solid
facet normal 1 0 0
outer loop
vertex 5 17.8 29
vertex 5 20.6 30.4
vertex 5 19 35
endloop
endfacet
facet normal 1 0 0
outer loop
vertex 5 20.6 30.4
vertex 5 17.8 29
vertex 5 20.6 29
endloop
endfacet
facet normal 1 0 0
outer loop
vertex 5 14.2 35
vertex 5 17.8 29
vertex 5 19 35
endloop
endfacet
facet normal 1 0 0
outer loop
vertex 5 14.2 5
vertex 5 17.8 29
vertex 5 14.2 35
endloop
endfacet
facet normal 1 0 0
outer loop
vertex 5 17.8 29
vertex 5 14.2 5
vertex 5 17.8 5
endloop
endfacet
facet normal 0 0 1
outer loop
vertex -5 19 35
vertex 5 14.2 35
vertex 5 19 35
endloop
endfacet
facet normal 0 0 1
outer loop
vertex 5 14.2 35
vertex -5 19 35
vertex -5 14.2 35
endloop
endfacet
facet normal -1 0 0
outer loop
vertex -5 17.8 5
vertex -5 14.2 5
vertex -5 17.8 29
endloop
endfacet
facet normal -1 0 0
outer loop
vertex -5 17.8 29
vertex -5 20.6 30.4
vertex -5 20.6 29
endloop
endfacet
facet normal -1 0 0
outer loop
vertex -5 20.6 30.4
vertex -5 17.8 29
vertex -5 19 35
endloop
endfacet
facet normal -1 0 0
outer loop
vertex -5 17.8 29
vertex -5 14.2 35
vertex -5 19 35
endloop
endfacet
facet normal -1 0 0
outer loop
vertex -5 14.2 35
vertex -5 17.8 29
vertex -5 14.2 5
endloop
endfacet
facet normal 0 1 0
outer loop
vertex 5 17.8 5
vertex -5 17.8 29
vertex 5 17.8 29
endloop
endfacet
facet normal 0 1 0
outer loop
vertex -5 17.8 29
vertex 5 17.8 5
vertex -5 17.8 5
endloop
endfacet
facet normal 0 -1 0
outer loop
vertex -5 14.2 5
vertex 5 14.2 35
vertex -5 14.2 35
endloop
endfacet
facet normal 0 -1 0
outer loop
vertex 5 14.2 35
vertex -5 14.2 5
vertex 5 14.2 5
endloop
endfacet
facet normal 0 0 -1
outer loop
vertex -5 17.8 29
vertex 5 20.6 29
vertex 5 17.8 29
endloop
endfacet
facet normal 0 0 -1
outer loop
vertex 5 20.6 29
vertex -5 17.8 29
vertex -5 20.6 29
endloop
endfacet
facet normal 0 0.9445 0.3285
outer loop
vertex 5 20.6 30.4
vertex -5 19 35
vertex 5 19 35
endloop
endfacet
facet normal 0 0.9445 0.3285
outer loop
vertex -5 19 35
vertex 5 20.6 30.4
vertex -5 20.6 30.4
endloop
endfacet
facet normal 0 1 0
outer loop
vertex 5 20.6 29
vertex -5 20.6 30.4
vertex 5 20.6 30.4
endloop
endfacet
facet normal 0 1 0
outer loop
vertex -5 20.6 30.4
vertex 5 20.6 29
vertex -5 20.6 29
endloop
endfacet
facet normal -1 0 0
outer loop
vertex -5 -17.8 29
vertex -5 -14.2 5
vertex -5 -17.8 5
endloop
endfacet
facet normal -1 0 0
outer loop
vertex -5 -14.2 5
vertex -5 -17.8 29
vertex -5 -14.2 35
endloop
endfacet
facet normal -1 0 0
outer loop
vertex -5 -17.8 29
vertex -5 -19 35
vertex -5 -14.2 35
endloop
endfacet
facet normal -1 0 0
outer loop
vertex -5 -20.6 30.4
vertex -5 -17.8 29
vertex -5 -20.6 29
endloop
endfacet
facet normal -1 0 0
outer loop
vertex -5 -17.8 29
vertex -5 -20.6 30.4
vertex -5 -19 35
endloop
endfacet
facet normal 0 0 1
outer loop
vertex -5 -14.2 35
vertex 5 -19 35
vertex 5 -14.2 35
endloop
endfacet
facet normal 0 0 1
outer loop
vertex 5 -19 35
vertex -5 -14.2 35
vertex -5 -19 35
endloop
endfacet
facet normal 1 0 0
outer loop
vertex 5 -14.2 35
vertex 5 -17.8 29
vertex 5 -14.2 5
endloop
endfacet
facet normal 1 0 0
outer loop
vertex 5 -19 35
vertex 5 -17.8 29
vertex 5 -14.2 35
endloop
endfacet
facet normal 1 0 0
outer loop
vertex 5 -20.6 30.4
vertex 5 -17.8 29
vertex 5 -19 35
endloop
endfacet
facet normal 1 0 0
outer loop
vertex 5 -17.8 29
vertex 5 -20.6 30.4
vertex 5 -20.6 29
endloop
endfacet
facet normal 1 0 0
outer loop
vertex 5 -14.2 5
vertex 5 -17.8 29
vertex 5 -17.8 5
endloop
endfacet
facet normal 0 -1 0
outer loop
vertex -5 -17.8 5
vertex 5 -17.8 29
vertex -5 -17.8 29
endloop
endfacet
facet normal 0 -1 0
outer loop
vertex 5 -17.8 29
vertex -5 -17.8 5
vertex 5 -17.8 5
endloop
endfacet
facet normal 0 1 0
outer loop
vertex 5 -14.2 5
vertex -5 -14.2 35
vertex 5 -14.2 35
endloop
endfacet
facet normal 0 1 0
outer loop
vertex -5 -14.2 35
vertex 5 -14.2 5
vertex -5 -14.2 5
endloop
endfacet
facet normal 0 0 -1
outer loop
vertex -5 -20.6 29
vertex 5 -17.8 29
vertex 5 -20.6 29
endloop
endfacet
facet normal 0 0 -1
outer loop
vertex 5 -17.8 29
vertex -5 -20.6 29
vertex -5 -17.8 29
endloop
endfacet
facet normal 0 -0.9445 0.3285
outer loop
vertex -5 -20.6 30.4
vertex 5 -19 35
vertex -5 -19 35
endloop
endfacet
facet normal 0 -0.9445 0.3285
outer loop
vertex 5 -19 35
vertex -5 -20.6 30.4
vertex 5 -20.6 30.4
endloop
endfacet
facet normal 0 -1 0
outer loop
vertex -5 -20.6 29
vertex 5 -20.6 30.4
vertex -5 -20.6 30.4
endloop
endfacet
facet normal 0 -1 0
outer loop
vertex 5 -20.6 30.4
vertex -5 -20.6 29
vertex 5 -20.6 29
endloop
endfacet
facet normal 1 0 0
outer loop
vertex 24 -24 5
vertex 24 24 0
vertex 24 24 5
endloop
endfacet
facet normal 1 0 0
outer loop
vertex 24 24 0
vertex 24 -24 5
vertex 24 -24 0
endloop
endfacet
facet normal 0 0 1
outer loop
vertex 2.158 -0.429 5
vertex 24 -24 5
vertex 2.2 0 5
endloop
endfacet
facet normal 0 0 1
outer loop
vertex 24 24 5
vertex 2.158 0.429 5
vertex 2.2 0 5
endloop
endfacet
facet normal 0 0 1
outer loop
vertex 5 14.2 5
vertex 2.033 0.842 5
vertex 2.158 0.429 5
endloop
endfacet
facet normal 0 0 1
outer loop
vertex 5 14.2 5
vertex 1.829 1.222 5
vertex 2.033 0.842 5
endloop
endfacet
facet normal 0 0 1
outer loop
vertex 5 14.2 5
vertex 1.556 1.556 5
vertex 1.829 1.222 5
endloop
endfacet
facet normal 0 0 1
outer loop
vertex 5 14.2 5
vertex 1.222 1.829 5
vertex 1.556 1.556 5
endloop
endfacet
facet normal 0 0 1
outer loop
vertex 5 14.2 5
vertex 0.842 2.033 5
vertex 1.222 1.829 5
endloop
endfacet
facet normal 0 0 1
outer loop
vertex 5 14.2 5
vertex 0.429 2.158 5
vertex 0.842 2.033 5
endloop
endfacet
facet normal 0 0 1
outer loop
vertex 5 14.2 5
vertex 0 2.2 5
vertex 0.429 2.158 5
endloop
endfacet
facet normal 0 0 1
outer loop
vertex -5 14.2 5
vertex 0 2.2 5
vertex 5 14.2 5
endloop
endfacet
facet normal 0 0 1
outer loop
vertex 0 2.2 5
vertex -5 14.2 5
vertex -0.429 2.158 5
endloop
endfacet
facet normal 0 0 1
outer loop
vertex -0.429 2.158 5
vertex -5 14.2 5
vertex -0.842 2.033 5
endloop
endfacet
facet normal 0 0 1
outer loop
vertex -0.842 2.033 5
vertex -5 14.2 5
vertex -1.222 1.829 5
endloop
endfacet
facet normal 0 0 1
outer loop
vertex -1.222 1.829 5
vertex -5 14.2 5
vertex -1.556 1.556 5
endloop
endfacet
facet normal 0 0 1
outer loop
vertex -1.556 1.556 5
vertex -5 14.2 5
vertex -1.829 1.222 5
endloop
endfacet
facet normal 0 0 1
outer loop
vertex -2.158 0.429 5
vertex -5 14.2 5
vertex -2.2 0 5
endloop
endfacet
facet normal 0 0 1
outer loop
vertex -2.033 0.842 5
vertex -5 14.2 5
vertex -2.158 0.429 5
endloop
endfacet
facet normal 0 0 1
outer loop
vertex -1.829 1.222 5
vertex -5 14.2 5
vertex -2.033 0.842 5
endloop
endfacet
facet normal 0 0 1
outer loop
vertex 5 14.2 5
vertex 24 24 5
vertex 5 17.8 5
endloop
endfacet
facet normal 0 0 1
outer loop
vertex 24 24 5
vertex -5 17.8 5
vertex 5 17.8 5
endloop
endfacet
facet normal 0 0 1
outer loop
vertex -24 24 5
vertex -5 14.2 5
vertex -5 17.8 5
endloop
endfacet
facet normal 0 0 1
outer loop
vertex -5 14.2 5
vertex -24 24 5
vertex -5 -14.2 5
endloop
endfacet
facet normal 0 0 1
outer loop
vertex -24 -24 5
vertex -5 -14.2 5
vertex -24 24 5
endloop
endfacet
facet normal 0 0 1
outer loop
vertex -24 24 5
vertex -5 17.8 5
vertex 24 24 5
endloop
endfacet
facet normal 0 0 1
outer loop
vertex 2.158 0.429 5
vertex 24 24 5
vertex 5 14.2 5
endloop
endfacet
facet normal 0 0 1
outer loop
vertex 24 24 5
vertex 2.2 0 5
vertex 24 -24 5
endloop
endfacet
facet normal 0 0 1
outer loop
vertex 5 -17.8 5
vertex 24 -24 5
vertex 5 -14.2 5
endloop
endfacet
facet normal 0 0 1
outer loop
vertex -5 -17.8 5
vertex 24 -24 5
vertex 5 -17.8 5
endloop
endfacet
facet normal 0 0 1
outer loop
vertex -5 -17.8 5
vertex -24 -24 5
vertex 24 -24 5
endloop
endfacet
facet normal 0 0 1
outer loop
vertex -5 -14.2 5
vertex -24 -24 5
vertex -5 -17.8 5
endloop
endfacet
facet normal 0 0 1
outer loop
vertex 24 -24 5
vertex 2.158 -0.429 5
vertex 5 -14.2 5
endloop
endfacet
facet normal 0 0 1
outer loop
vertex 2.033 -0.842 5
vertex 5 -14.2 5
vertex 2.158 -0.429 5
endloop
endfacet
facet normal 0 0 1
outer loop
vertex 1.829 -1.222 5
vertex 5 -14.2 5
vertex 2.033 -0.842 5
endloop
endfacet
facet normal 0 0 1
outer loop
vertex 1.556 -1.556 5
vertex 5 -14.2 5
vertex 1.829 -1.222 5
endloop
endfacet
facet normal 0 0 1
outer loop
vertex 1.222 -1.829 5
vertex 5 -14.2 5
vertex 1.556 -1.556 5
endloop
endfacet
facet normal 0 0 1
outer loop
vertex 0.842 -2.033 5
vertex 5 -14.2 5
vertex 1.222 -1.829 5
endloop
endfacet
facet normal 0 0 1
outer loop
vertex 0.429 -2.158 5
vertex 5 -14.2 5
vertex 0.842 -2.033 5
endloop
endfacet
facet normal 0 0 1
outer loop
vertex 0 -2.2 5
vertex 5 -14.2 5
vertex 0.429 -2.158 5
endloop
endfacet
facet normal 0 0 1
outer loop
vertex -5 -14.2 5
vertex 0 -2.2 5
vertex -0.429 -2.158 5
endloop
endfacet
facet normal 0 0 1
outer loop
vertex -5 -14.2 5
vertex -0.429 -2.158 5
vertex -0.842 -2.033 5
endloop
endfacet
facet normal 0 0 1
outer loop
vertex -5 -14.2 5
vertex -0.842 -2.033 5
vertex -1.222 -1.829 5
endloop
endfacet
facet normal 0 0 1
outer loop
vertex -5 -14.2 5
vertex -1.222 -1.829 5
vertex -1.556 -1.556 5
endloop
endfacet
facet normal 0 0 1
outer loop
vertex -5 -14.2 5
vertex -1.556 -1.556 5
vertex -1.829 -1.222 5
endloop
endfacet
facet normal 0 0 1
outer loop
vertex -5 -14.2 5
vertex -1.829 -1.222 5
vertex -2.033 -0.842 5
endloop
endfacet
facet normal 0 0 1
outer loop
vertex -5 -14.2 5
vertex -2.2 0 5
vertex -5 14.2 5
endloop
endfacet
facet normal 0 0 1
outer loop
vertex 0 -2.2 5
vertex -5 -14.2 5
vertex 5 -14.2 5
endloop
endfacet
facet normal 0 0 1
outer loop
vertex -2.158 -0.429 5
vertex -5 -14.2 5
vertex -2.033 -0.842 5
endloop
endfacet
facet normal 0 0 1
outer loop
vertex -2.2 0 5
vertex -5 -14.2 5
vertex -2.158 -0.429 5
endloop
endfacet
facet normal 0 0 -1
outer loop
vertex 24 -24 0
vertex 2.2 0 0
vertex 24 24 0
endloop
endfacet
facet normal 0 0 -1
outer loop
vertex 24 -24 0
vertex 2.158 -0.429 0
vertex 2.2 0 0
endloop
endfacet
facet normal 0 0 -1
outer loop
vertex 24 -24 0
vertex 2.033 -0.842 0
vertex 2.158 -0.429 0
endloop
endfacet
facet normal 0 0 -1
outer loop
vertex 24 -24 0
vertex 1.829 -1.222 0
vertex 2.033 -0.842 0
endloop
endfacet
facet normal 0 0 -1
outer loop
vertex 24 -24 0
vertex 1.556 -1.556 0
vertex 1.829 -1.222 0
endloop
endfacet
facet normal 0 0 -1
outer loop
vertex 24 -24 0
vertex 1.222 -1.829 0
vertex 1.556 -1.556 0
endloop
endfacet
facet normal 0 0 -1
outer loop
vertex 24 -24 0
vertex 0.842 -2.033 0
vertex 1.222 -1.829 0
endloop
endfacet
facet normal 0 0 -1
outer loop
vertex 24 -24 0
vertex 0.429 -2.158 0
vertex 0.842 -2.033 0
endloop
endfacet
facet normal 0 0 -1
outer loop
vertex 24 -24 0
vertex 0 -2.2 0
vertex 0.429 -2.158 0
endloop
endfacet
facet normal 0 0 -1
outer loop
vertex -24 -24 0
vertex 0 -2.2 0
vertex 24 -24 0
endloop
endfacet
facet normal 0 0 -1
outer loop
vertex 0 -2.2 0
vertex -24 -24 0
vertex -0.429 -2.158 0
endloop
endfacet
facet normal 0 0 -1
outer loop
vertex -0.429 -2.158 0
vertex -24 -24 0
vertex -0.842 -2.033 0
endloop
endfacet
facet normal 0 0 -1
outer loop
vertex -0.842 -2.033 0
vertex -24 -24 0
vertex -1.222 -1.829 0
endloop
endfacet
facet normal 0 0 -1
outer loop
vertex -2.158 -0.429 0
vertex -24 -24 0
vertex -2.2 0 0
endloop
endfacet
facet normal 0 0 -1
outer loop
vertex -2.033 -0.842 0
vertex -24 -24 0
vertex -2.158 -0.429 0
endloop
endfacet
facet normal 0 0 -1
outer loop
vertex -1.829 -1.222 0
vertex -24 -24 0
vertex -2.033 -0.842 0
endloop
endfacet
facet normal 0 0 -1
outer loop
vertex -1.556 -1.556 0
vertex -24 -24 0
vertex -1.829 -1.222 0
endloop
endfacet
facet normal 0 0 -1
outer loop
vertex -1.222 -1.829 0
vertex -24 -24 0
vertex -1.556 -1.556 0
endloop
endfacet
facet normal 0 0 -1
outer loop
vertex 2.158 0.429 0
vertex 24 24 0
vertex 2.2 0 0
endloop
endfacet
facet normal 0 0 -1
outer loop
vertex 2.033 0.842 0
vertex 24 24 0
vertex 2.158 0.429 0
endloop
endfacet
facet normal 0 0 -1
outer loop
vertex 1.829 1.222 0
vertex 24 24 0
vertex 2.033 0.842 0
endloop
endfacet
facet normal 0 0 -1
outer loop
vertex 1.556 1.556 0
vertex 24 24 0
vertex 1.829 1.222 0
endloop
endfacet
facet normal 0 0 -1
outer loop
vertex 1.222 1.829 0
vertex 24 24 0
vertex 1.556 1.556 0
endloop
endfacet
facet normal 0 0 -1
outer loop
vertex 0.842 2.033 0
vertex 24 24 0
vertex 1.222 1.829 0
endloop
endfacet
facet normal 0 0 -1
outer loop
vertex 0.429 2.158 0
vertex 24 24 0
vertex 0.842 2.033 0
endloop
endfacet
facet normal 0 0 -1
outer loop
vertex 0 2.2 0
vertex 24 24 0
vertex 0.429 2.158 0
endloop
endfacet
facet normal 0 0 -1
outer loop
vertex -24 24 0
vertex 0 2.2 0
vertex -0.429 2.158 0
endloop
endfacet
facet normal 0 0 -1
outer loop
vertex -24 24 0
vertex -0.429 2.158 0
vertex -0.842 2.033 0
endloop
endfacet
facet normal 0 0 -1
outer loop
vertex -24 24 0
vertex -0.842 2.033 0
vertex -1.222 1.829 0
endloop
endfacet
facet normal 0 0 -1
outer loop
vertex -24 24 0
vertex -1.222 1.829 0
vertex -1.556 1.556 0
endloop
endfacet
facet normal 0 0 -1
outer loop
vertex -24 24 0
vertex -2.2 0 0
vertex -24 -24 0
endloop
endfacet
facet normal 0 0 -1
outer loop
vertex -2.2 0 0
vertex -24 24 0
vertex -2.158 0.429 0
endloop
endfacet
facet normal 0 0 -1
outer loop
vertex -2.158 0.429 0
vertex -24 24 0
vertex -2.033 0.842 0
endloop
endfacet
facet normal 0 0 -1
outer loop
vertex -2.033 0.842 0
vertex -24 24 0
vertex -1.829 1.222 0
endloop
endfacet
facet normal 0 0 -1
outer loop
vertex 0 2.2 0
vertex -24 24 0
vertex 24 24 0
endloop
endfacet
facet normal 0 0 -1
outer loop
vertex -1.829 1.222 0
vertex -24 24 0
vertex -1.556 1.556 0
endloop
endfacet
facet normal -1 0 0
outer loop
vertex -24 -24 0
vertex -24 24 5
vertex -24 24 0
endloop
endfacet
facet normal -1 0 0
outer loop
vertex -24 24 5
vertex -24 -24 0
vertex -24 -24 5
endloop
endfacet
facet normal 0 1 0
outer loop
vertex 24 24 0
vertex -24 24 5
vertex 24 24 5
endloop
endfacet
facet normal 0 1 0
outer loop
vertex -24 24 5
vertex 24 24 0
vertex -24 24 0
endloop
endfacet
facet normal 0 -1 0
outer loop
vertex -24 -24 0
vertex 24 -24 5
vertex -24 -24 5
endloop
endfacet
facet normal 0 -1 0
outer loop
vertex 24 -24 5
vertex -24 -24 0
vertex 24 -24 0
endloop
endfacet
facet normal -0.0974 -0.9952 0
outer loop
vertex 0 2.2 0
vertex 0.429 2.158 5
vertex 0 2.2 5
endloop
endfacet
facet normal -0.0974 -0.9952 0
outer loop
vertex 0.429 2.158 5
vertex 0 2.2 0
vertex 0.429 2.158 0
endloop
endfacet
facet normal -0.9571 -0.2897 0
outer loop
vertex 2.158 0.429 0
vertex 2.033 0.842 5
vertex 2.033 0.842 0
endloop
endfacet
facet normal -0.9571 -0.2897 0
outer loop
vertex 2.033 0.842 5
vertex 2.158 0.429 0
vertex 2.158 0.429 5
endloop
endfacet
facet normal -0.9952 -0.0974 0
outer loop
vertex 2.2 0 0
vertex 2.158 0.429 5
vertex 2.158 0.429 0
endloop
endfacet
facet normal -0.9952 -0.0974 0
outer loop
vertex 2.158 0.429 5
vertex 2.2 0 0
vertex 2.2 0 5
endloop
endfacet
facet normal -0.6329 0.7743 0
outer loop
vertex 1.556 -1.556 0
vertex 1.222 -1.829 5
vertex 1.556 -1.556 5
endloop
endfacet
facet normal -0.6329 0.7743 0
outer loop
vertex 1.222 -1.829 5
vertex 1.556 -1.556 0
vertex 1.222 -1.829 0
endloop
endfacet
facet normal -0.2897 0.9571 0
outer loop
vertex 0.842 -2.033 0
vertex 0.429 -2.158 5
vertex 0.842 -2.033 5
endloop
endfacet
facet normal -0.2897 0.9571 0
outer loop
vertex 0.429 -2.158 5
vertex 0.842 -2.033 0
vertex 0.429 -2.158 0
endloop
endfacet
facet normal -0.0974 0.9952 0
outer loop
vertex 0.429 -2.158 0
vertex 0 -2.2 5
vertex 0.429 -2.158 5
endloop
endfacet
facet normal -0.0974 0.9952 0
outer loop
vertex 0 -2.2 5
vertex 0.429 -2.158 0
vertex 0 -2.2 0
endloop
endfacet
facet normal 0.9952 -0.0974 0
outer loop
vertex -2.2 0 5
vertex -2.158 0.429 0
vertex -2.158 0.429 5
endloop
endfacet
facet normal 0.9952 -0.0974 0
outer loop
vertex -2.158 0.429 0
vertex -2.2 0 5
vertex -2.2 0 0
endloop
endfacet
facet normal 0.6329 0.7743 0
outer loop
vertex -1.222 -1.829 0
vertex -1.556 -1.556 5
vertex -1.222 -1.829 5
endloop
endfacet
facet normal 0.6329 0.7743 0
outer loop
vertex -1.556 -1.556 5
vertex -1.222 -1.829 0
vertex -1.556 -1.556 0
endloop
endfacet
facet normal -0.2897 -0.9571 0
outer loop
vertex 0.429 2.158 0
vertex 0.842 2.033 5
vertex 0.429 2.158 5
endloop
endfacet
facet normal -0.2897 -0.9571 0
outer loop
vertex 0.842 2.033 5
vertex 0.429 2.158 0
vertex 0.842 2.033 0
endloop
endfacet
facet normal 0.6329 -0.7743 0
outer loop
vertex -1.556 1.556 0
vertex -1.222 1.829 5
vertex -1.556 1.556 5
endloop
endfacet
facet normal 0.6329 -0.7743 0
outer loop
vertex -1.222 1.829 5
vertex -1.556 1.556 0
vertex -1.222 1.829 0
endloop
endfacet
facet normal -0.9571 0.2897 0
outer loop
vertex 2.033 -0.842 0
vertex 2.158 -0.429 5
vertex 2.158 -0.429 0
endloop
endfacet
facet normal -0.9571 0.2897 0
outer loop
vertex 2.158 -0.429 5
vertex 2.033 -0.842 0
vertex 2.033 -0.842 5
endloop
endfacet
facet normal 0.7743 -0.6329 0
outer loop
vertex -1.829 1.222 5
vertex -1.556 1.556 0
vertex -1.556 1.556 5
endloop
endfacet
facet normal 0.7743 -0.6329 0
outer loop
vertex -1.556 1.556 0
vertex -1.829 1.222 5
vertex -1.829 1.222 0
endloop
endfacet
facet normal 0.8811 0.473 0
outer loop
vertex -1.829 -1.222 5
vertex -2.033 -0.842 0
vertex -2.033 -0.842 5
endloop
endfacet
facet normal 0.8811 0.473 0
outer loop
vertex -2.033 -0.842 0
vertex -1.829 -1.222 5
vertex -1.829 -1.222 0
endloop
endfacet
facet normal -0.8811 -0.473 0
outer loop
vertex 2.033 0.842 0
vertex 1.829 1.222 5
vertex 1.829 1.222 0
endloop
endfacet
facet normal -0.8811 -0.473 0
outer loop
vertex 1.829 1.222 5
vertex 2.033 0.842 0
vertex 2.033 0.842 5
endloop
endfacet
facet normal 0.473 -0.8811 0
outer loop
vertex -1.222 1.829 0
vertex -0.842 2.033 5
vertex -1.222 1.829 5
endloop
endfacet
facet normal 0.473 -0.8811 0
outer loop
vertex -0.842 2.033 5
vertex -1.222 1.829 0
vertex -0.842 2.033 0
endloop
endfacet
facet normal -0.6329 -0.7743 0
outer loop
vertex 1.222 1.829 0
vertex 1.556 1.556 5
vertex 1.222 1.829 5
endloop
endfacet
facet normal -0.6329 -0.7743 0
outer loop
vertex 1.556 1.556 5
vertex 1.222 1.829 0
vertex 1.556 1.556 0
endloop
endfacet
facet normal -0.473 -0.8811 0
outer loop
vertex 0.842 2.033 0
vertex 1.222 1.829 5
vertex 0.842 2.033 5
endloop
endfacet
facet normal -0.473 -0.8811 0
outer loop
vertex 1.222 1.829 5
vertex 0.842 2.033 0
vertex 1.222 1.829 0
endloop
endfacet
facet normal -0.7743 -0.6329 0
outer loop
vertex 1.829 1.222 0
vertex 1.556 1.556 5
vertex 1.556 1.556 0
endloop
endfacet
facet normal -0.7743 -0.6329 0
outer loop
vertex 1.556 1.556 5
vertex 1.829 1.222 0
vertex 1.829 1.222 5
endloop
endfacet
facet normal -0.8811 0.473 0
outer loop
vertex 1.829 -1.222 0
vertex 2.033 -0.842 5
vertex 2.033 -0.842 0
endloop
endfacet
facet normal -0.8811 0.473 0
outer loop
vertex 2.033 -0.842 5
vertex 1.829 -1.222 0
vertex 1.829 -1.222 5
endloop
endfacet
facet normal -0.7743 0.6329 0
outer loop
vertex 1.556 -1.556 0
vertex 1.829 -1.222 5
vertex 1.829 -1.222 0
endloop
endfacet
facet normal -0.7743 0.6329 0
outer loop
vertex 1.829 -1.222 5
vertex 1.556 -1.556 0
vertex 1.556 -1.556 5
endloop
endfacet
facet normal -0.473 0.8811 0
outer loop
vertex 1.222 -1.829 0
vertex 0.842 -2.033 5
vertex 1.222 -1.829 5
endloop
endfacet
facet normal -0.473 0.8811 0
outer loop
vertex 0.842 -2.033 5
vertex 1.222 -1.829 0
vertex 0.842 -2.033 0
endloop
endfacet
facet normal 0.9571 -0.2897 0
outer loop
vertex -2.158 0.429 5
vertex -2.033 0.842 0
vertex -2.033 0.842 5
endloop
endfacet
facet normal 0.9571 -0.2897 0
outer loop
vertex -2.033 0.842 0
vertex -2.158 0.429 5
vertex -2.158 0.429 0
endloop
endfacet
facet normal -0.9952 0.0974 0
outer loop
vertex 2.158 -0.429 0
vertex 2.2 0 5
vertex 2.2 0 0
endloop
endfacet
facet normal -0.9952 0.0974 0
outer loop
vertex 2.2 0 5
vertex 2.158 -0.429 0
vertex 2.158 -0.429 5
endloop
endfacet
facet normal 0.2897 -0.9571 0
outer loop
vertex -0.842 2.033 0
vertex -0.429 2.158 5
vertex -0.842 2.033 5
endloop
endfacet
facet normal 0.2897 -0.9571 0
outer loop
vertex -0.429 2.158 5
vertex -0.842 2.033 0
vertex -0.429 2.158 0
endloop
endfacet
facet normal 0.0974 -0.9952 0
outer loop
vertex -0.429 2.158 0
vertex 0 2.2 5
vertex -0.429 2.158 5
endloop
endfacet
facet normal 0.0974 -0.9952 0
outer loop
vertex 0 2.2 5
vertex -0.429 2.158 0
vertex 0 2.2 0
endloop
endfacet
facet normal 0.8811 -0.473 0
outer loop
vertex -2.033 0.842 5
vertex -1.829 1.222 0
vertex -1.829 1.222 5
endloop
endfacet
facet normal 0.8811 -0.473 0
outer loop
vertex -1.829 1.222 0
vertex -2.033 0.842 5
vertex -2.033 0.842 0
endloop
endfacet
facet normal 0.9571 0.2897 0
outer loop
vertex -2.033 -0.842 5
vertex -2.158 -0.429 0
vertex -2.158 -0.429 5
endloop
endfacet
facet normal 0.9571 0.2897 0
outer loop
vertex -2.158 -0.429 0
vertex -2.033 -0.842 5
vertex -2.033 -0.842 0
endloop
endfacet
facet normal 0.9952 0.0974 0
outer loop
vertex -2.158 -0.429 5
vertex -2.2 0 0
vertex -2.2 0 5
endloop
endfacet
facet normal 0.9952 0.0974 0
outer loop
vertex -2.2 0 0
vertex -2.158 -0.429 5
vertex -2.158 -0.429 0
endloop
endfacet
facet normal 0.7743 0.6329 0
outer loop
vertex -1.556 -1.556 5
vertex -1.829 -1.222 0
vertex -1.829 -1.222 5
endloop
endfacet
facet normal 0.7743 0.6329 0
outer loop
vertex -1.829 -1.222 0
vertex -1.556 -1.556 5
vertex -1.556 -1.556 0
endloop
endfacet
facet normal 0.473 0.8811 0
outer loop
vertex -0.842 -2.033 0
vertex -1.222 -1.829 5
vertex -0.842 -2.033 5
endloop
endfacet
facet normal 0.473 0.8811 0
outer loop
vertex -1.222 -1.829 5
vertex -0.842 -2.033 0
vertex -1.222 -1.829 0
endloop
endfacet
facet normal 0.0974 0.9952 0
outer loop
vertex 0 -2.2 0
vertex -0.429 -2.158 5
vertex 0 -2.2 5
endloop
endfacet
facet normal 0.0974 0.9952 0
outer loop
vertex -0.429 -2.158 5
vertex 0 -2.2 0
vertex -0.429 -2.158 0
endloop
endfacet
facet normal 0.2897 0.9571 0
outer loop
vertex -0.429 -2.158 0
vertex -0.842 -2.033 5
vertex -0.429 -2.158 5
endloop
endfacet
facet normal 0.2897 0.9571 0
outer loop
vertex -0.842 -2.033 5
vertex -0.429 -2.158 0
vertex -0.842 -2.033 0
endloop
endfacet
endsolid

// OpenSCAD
$fn = 32;

// ----------------------------------------------------------------------
// Snap-fit latch: 2 arms, 30 mm tall, 3 mm undercut hooks
// ----------------------------------------------------------------------

// --- parameters (mm) ---
base_d = 48;              // base plate depth
base_h = 5;               // base plate thickness
span = 32;                // distance between opposite arms
arm_t = 3.6;              // arm thickness
arm_d = 10;               // arm width
height = 30;              // free arm length
head_len = 3;             // hook reach
head_h = 6;               // hook height
lead = 1.4;               // lead-in ramp thickness
bore_d = 4.4;             // base fixing bore
top_z = 35;               // height of the arm tips above the base

arms = 2;

difference() {
  union() {
    /* base plate, centred on the arm ring */
    translate([-24, -24, 0]) cube([base_d, base_d, base_h]);
    for (a = [0 : 360 / arms : 359]) rotate([0, 0, a]) {
    /* arm, sunk 0.5 mm into the base */
    translate([-arm_d / 2, span / 2 - arm_t / 2, base_h - 0.5]) cube([arm_d, arm_t, height + 0.5]);
    /* hook: a convex hull of a tall inner block and a thin outer lip
       gives a flat undercut below and a lead-in ramp on top */
    hull() {
      translate([-arm_d / 2, span / 2 + arm_t / 2 - 0.6, top_z - head_h]) cube([arm_d, lead + 0.4, head_h]);
      translate([-arm_d / 2, span / 2 + arm_t / 2 - 0.2, top_z - head_h]) cube([arm_d, head_len, lead]);
    }
    }
  }
  translate([0, 0, -2.5]) cylinder(h = base_h + 5, d = bore_d);
}
